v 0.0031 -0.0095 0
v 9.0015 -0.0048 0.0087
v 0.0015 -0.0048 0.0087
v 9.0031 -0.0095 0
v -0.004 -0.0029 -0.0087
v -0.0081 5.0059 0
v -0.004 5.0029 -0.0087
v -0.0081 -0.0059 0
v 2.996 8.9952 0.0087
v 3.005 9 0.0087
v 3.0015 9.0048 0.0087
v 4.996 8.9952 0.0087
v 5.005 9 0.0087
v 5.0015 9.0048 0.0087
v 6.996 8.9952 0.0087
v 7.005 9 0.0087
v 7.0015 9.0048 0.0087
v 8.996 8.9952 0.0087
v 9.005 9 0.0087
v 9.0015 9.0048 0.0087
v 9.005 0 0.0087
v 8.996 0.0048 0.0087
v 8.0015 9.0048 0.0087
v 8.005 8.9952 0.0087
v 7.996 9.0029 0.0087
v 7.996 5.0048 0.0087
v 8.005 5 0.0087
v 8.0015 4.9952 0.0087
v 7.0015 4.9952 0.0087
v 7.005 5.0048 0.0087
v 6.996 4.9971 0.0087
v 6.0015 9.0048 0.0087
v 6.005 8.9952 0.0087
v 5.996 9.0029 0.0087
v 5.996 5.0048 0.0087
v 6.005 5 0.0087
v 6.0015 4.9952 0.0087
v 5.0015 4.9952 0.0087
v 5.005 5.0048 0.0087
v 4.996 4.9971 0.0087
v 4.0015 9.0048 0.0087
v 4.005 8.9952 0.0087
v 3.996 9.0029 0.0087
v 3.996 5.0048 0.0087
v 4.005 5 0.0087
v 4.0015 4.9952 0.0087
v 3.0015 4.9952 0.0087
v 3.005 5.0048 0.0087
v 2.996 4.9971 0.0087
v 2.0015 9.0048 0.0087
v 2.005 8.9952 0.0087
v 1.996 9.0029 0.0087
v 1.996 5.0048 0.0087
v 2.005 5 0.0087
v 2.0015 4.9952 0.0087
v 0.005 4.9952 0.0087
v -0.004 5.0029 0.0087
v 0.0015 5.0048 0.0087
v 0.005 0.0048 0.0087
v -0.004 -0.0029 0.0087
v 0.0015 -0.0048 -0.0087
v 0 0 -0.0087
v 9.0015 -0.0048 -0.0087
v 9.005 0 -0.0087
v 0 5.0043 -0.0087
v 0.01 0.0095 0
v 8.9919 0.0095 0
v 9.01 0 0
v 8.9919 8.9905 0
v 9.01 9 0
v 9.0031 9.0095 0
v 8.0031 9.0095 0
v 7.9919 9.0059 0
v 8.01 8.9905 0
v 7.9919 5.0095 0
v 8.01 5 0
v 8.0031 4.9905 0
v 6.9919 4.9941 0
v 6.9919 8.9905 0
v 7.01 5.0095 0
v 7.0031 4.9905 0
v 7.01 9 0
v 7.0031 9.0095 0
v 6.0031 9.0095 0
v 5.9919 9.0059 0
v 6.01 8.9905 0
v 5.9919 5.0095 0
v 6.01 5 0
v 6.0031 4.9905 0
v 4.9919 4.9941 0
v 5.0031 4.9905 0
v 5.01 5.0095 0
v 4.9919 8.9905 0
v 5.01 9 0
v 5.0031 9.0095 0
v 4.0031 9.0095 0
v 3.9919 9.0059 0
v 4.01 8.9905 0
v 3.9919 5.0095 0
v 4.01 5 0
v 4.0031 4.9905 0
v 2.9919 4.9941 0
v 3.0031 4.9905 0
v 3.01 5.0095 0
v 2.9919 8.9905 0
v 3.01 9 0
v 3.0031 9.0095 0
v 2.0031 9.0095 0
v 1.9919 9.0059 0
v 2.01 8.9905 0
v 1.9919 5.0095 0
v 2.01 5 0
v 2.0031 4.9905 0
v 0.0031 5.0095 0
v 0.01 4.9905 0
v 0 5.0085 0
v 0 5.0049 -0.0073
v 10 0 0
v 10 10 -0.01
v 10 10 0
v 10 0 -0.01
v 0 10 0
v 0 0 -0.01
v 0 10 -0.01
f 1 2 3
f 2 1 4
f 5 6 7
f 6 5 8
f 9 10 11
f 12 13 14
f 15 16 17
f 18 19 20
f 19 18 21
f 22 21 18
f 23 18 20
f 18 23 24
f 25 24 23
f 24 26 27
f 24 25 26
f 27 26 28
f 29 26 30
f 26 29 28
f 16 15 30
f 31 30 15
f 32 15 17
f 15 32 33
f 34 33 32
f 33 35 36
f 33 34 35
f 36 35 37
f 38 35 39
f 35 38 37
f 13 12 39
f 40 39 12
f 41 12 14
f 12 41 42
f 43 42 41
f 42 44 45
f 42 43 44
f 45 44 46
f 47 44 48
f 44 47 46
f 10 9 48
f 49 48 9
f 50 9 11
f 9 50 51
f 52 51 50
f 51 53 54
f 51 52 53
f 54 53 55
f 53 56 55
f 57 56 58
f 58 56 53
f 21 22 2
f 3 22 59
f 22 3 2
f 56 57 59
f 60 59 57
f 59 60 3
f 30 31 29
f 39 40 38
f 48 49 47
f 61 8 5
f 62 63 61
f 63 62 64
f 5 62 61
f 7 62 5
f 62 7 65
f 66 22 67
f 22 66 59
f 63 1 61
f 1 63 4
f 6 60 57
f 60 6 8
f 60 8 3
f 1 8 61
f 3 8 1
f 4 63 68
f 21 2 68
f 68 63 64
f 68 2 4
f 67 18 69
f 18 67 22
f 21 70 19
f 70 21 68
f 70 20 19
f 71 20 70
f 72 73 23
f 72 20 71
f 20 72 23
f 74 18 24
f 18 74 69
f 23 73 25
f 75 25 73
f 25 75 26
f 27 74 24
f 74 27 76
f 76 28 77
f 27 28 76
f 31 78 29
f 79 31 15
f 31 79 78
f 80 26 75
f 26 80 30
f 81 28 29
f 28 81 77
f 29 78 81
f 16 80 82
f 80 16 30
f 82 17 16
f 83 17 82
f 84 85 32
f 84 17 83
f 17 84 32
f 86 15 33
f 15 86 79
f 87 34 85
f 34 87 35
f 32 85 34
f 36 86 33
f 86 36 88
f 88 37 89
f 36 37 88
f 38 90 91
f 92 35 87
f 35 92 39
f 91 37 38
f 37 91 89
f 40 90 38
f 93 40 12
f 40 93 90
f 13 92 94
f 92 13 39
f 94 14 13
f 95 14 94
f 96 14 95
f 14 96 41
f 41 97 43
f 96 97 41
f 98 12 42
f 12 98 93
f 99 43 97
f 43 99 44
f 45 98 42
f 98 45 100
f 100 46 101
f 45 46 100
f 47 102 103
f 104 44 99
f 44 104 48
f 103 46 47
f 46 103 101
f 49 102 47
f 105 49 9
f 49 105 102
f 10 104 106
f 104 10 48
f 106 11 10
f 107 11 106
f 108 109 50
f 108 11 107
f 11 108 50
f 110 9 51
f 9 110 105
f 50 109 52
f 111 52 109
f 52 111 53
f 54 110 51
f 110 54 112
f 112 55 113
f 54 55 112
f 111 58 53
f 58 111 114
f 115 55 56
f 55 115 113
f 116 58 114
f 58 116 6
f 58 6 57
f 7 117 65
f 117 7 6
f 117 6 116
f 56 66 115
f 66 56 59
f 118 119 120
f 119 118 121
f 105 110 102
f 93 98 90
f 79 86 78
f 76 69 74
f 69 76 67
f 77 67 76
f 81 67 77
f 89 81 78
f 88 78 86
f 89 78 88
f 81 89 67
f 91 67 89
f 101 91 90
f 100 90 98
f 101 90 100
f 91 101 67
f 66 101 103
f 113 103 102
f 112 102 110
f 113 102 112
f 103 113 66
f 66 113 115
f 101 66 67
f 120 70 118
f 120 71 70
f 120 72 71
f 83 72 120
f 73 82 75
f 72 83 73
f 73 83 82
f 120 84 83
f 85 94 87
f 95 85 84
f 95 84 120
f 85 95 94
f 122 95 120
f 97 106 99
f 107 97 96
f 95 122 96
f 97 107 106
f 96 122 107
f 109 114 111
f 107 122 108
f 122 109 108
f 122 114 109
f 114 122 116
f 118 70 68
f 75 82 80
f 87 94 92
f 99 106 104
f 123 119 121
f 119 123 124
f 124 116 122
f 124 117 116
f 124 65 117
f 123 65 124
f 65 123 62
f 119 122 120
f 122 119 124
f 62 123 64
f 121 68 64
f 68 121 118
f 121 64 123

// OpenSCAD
hull(){
    translate([0, 0]) sphere(0.01);
    translate([1, 0]) sphere(0.01);
}
hull(){
    translate([1, 0]) sphere(0.01);
    translate([2, 0]) sphere(0.01);
}
hull(){
    translate([2, 0]) sphere(0.01);
    translate([3, 0]) sphere(0.01);
}
hull(){
    translate([3, 0]) sphere(0.01);
    translate([4, 0]) sphere(0.01);
}
hull(){
    translate([4, 0]) sphere(0.01);
    translate([5, 0]) sphere(0.01);
}
hull(){
    translate([5, 0]) sphere(0.01);
    translate([6, 0]) sphere(0.01);
}
hull(){
    translate([6, 0]) sphere(0.01);
    translate([7, 0]) sphere(0.01);
}
hull(){
    translate([7, 0]) sphere(0.01);
    translate([8, 0]) sphere(0.01);
}
hull(){
    translate([8, 0]) sphere(0.01);
    translate([9, 0]) sphere(0.01);
}
hull(){
    translate([9, 0]) sphere(0.01);
    translate([9, 1]) sphere(0.01);
}
hull(){
    translate([9, 1]) sphere(0.01);
    translate([9, 2]) sphere(0.01);
}
hull(){
    translate([9, 2]) sphere(0.01);
    translate([9, 3]) sphere(0.01);
}
hull(){
    translate([9, 3]) sphere(0.01);
    translate([9, 4]) sphere(0.01);
}
hull(){
    translate([9, 4]) sphere(0.01);
    translate([9, 5]) sphere(0.01);
}
hull(){
    translate([9, 5]) sphere(0.01);
    translate([9, 6]) sphere(0.01);
}
hull(){
    translate([9, 6]) sphere(0.01);
    translate([9, 7]) sphere(0.01);
}
hull(){
    translate([9, 7]) sphere(0.01);
    translate([9, 8]) sphere(0.01);
}
hull(){
    translate([9, 8]) sphere(0.01);
    translate([9, 9]) sphere(0.01);
}
hull(){
    translate([9, 9]) sphere(0.01);
    translate([8, 9]) sphere(0.01);
}
hull(){
    translate([8, 9]) sphere(0.01);
    translate([8, 8]) sphere(0.01);
}
hull(){
    translate([8, 8]) sphere(0.01);
    translate([8, 7]) sphere(0.01);
}
hull(){
    translate([8, 7]) sphere(0.01);
    translate([8, 6]) sphere(0.01);
}
hull(){
    translate([8, 6]) sphere(0.01);
    translate([8, 5]) sphere(0.01);
}
hull(){
    translate([8, 5]) sphere(0.01);
    translate([7, 5]) sphere(0.01);
}
hull(){
    translate([7, 5]) sphere(0.01);
    translate([7, 6]) sphere(0.01);
}
hull(){
    translate([7, 6]) sphere(0.01);
    translate([7, 7]) sphere(0.01);
}
hull(){
    translate([7, 7]) sphere(0.01);
    translate([7, 8]) sphere(0.01);
}
hull(){
    translate([7, 8]) sphere(0.01);
    translate([7, 9]) sphere(0.01);
}
hull(){
    translate([7, 9]) sphere(0.01);
    translate([6, 9]) sphere(0.01);
}
hull(){
    translate([6, 9]) sphere(0.01);
    translate([6, 8]) sphere(0.01);
}
hull(){
    translate([6, 8]) sphere(0.01);
    translate([6, 7]) sphere(0.01);
}
hull(){
    translate([6, 7]) sphere(0.01);
    translate([6, 6]) sphere(0.01);
}
hull(){
    translate([6, 6]) sphere(0.01);
    translate([6, 5]) sphere(0.01);
}
hull(){
    translate([6, 5]) sphere(0.01);
    translate([5, 5]) sphere(0.01);
}
hull(){
    translate([5, 5]) sphere(0.01);
    translate([5, 6]) sphere(0.01);
}
hull(){
    translate([5, 6]) sphere(0.01);
    translate([5, 7]) sphere(0.01);
}
hull(){
    translate([5, 7]) sphere(0.01);
    translate([5, 8]) sphere(0.01);
}
hull(){
    translate([5, 8]) sphere(0.01);
    translate([5, 9]) sphere(0.01);
}
hull(){
    translate([5, 9]) sphere(0.01);
    translate([4, 9]) sphere(0.01);
}
hull(){
    translate([4, 9]) sphere(0.01);
    translate([4, 8]) sphere(0.01);
}
hull(){
    translate([4, 8]) sphere(0.01);
    translate([4, 7]) sphere(0.01);
}
hull(){
    translate([4, 7]) sphere(0.01);
    translate([4, 6]) sphere(0.01);
}
hull(){
    translate([4, 6]) sphere(0.01);
    translate([4, 5]) sphere(0.01);
}
hull(){
    translate([4, 5]) sphere(0.01);
    translate([3, 5]) sphere(0.01);
}
hull(){
    translate([3, 5]) sphere(0.01);
    translate([3, 6]) sphere(0.01);
}
hull(){
    translate([3, 6]) sphere(0.01);
    translate([3, 7]) sphere(0.01);
}
hull(){
    translate([3, 7]) sphere(0.01);
    translate([3, 8]) sphere(0.01);
}
hull(){
    translate([3, 8]) sphere(0.01);
    translate([3, 9]) sphere(0.01);
}
hull(){
    translate([3, 9]) sphere(0.01);
    translate([2, 9]) sphere(0.01);
}
hull(){
    translate([2, 9]) sphere(0.01);
    translate([2, 8]) sphere(0.01);
}
hull(){
    translate([2, 8]) sphere(0.01);
    translate([2, 7]) sphere(0.01);
}
hull(){
    translate([2, 7]) sphere(0.01);
    translate([2, 6]) sphere(0.01);
}
hull(){
    translate([2, 6]) sphere(0.01);
    translate([2, 5]) sphere(0.01);
}
hull(){
    translate([2, 5]) sphere(0.01);
    translate([1, 5]) sphere(0.01);
}
hull(){
    translate([1, 5]) sphere(0.01);
    translate([0, 5]) sphere(0.01);
}
hull(){
    translate([0, 5]) sphere(0.01);
    translate([0, 4]) sphere(0.01);
}
hull(){
    translate([0, 4]) sphere(0.01);
    translate([0, 3]) sphere(0.01);
}
hull(){
    translate([0, 3]) sphere(0.01);
    translate([0, 2]) sphere(0.01);
}
hull(){
    translate([0, 2]) sphere(0.01);
    translate([0, 1]) sphere(0.01);
}
hull(){
    translate([0, 1]) sphere(0.01);
    translate([0, 0]) sphere(0.01);
}
translate([0,0,-0.01]) color([0.1,0.1,0.1]) cube([10,10,0.01]);
